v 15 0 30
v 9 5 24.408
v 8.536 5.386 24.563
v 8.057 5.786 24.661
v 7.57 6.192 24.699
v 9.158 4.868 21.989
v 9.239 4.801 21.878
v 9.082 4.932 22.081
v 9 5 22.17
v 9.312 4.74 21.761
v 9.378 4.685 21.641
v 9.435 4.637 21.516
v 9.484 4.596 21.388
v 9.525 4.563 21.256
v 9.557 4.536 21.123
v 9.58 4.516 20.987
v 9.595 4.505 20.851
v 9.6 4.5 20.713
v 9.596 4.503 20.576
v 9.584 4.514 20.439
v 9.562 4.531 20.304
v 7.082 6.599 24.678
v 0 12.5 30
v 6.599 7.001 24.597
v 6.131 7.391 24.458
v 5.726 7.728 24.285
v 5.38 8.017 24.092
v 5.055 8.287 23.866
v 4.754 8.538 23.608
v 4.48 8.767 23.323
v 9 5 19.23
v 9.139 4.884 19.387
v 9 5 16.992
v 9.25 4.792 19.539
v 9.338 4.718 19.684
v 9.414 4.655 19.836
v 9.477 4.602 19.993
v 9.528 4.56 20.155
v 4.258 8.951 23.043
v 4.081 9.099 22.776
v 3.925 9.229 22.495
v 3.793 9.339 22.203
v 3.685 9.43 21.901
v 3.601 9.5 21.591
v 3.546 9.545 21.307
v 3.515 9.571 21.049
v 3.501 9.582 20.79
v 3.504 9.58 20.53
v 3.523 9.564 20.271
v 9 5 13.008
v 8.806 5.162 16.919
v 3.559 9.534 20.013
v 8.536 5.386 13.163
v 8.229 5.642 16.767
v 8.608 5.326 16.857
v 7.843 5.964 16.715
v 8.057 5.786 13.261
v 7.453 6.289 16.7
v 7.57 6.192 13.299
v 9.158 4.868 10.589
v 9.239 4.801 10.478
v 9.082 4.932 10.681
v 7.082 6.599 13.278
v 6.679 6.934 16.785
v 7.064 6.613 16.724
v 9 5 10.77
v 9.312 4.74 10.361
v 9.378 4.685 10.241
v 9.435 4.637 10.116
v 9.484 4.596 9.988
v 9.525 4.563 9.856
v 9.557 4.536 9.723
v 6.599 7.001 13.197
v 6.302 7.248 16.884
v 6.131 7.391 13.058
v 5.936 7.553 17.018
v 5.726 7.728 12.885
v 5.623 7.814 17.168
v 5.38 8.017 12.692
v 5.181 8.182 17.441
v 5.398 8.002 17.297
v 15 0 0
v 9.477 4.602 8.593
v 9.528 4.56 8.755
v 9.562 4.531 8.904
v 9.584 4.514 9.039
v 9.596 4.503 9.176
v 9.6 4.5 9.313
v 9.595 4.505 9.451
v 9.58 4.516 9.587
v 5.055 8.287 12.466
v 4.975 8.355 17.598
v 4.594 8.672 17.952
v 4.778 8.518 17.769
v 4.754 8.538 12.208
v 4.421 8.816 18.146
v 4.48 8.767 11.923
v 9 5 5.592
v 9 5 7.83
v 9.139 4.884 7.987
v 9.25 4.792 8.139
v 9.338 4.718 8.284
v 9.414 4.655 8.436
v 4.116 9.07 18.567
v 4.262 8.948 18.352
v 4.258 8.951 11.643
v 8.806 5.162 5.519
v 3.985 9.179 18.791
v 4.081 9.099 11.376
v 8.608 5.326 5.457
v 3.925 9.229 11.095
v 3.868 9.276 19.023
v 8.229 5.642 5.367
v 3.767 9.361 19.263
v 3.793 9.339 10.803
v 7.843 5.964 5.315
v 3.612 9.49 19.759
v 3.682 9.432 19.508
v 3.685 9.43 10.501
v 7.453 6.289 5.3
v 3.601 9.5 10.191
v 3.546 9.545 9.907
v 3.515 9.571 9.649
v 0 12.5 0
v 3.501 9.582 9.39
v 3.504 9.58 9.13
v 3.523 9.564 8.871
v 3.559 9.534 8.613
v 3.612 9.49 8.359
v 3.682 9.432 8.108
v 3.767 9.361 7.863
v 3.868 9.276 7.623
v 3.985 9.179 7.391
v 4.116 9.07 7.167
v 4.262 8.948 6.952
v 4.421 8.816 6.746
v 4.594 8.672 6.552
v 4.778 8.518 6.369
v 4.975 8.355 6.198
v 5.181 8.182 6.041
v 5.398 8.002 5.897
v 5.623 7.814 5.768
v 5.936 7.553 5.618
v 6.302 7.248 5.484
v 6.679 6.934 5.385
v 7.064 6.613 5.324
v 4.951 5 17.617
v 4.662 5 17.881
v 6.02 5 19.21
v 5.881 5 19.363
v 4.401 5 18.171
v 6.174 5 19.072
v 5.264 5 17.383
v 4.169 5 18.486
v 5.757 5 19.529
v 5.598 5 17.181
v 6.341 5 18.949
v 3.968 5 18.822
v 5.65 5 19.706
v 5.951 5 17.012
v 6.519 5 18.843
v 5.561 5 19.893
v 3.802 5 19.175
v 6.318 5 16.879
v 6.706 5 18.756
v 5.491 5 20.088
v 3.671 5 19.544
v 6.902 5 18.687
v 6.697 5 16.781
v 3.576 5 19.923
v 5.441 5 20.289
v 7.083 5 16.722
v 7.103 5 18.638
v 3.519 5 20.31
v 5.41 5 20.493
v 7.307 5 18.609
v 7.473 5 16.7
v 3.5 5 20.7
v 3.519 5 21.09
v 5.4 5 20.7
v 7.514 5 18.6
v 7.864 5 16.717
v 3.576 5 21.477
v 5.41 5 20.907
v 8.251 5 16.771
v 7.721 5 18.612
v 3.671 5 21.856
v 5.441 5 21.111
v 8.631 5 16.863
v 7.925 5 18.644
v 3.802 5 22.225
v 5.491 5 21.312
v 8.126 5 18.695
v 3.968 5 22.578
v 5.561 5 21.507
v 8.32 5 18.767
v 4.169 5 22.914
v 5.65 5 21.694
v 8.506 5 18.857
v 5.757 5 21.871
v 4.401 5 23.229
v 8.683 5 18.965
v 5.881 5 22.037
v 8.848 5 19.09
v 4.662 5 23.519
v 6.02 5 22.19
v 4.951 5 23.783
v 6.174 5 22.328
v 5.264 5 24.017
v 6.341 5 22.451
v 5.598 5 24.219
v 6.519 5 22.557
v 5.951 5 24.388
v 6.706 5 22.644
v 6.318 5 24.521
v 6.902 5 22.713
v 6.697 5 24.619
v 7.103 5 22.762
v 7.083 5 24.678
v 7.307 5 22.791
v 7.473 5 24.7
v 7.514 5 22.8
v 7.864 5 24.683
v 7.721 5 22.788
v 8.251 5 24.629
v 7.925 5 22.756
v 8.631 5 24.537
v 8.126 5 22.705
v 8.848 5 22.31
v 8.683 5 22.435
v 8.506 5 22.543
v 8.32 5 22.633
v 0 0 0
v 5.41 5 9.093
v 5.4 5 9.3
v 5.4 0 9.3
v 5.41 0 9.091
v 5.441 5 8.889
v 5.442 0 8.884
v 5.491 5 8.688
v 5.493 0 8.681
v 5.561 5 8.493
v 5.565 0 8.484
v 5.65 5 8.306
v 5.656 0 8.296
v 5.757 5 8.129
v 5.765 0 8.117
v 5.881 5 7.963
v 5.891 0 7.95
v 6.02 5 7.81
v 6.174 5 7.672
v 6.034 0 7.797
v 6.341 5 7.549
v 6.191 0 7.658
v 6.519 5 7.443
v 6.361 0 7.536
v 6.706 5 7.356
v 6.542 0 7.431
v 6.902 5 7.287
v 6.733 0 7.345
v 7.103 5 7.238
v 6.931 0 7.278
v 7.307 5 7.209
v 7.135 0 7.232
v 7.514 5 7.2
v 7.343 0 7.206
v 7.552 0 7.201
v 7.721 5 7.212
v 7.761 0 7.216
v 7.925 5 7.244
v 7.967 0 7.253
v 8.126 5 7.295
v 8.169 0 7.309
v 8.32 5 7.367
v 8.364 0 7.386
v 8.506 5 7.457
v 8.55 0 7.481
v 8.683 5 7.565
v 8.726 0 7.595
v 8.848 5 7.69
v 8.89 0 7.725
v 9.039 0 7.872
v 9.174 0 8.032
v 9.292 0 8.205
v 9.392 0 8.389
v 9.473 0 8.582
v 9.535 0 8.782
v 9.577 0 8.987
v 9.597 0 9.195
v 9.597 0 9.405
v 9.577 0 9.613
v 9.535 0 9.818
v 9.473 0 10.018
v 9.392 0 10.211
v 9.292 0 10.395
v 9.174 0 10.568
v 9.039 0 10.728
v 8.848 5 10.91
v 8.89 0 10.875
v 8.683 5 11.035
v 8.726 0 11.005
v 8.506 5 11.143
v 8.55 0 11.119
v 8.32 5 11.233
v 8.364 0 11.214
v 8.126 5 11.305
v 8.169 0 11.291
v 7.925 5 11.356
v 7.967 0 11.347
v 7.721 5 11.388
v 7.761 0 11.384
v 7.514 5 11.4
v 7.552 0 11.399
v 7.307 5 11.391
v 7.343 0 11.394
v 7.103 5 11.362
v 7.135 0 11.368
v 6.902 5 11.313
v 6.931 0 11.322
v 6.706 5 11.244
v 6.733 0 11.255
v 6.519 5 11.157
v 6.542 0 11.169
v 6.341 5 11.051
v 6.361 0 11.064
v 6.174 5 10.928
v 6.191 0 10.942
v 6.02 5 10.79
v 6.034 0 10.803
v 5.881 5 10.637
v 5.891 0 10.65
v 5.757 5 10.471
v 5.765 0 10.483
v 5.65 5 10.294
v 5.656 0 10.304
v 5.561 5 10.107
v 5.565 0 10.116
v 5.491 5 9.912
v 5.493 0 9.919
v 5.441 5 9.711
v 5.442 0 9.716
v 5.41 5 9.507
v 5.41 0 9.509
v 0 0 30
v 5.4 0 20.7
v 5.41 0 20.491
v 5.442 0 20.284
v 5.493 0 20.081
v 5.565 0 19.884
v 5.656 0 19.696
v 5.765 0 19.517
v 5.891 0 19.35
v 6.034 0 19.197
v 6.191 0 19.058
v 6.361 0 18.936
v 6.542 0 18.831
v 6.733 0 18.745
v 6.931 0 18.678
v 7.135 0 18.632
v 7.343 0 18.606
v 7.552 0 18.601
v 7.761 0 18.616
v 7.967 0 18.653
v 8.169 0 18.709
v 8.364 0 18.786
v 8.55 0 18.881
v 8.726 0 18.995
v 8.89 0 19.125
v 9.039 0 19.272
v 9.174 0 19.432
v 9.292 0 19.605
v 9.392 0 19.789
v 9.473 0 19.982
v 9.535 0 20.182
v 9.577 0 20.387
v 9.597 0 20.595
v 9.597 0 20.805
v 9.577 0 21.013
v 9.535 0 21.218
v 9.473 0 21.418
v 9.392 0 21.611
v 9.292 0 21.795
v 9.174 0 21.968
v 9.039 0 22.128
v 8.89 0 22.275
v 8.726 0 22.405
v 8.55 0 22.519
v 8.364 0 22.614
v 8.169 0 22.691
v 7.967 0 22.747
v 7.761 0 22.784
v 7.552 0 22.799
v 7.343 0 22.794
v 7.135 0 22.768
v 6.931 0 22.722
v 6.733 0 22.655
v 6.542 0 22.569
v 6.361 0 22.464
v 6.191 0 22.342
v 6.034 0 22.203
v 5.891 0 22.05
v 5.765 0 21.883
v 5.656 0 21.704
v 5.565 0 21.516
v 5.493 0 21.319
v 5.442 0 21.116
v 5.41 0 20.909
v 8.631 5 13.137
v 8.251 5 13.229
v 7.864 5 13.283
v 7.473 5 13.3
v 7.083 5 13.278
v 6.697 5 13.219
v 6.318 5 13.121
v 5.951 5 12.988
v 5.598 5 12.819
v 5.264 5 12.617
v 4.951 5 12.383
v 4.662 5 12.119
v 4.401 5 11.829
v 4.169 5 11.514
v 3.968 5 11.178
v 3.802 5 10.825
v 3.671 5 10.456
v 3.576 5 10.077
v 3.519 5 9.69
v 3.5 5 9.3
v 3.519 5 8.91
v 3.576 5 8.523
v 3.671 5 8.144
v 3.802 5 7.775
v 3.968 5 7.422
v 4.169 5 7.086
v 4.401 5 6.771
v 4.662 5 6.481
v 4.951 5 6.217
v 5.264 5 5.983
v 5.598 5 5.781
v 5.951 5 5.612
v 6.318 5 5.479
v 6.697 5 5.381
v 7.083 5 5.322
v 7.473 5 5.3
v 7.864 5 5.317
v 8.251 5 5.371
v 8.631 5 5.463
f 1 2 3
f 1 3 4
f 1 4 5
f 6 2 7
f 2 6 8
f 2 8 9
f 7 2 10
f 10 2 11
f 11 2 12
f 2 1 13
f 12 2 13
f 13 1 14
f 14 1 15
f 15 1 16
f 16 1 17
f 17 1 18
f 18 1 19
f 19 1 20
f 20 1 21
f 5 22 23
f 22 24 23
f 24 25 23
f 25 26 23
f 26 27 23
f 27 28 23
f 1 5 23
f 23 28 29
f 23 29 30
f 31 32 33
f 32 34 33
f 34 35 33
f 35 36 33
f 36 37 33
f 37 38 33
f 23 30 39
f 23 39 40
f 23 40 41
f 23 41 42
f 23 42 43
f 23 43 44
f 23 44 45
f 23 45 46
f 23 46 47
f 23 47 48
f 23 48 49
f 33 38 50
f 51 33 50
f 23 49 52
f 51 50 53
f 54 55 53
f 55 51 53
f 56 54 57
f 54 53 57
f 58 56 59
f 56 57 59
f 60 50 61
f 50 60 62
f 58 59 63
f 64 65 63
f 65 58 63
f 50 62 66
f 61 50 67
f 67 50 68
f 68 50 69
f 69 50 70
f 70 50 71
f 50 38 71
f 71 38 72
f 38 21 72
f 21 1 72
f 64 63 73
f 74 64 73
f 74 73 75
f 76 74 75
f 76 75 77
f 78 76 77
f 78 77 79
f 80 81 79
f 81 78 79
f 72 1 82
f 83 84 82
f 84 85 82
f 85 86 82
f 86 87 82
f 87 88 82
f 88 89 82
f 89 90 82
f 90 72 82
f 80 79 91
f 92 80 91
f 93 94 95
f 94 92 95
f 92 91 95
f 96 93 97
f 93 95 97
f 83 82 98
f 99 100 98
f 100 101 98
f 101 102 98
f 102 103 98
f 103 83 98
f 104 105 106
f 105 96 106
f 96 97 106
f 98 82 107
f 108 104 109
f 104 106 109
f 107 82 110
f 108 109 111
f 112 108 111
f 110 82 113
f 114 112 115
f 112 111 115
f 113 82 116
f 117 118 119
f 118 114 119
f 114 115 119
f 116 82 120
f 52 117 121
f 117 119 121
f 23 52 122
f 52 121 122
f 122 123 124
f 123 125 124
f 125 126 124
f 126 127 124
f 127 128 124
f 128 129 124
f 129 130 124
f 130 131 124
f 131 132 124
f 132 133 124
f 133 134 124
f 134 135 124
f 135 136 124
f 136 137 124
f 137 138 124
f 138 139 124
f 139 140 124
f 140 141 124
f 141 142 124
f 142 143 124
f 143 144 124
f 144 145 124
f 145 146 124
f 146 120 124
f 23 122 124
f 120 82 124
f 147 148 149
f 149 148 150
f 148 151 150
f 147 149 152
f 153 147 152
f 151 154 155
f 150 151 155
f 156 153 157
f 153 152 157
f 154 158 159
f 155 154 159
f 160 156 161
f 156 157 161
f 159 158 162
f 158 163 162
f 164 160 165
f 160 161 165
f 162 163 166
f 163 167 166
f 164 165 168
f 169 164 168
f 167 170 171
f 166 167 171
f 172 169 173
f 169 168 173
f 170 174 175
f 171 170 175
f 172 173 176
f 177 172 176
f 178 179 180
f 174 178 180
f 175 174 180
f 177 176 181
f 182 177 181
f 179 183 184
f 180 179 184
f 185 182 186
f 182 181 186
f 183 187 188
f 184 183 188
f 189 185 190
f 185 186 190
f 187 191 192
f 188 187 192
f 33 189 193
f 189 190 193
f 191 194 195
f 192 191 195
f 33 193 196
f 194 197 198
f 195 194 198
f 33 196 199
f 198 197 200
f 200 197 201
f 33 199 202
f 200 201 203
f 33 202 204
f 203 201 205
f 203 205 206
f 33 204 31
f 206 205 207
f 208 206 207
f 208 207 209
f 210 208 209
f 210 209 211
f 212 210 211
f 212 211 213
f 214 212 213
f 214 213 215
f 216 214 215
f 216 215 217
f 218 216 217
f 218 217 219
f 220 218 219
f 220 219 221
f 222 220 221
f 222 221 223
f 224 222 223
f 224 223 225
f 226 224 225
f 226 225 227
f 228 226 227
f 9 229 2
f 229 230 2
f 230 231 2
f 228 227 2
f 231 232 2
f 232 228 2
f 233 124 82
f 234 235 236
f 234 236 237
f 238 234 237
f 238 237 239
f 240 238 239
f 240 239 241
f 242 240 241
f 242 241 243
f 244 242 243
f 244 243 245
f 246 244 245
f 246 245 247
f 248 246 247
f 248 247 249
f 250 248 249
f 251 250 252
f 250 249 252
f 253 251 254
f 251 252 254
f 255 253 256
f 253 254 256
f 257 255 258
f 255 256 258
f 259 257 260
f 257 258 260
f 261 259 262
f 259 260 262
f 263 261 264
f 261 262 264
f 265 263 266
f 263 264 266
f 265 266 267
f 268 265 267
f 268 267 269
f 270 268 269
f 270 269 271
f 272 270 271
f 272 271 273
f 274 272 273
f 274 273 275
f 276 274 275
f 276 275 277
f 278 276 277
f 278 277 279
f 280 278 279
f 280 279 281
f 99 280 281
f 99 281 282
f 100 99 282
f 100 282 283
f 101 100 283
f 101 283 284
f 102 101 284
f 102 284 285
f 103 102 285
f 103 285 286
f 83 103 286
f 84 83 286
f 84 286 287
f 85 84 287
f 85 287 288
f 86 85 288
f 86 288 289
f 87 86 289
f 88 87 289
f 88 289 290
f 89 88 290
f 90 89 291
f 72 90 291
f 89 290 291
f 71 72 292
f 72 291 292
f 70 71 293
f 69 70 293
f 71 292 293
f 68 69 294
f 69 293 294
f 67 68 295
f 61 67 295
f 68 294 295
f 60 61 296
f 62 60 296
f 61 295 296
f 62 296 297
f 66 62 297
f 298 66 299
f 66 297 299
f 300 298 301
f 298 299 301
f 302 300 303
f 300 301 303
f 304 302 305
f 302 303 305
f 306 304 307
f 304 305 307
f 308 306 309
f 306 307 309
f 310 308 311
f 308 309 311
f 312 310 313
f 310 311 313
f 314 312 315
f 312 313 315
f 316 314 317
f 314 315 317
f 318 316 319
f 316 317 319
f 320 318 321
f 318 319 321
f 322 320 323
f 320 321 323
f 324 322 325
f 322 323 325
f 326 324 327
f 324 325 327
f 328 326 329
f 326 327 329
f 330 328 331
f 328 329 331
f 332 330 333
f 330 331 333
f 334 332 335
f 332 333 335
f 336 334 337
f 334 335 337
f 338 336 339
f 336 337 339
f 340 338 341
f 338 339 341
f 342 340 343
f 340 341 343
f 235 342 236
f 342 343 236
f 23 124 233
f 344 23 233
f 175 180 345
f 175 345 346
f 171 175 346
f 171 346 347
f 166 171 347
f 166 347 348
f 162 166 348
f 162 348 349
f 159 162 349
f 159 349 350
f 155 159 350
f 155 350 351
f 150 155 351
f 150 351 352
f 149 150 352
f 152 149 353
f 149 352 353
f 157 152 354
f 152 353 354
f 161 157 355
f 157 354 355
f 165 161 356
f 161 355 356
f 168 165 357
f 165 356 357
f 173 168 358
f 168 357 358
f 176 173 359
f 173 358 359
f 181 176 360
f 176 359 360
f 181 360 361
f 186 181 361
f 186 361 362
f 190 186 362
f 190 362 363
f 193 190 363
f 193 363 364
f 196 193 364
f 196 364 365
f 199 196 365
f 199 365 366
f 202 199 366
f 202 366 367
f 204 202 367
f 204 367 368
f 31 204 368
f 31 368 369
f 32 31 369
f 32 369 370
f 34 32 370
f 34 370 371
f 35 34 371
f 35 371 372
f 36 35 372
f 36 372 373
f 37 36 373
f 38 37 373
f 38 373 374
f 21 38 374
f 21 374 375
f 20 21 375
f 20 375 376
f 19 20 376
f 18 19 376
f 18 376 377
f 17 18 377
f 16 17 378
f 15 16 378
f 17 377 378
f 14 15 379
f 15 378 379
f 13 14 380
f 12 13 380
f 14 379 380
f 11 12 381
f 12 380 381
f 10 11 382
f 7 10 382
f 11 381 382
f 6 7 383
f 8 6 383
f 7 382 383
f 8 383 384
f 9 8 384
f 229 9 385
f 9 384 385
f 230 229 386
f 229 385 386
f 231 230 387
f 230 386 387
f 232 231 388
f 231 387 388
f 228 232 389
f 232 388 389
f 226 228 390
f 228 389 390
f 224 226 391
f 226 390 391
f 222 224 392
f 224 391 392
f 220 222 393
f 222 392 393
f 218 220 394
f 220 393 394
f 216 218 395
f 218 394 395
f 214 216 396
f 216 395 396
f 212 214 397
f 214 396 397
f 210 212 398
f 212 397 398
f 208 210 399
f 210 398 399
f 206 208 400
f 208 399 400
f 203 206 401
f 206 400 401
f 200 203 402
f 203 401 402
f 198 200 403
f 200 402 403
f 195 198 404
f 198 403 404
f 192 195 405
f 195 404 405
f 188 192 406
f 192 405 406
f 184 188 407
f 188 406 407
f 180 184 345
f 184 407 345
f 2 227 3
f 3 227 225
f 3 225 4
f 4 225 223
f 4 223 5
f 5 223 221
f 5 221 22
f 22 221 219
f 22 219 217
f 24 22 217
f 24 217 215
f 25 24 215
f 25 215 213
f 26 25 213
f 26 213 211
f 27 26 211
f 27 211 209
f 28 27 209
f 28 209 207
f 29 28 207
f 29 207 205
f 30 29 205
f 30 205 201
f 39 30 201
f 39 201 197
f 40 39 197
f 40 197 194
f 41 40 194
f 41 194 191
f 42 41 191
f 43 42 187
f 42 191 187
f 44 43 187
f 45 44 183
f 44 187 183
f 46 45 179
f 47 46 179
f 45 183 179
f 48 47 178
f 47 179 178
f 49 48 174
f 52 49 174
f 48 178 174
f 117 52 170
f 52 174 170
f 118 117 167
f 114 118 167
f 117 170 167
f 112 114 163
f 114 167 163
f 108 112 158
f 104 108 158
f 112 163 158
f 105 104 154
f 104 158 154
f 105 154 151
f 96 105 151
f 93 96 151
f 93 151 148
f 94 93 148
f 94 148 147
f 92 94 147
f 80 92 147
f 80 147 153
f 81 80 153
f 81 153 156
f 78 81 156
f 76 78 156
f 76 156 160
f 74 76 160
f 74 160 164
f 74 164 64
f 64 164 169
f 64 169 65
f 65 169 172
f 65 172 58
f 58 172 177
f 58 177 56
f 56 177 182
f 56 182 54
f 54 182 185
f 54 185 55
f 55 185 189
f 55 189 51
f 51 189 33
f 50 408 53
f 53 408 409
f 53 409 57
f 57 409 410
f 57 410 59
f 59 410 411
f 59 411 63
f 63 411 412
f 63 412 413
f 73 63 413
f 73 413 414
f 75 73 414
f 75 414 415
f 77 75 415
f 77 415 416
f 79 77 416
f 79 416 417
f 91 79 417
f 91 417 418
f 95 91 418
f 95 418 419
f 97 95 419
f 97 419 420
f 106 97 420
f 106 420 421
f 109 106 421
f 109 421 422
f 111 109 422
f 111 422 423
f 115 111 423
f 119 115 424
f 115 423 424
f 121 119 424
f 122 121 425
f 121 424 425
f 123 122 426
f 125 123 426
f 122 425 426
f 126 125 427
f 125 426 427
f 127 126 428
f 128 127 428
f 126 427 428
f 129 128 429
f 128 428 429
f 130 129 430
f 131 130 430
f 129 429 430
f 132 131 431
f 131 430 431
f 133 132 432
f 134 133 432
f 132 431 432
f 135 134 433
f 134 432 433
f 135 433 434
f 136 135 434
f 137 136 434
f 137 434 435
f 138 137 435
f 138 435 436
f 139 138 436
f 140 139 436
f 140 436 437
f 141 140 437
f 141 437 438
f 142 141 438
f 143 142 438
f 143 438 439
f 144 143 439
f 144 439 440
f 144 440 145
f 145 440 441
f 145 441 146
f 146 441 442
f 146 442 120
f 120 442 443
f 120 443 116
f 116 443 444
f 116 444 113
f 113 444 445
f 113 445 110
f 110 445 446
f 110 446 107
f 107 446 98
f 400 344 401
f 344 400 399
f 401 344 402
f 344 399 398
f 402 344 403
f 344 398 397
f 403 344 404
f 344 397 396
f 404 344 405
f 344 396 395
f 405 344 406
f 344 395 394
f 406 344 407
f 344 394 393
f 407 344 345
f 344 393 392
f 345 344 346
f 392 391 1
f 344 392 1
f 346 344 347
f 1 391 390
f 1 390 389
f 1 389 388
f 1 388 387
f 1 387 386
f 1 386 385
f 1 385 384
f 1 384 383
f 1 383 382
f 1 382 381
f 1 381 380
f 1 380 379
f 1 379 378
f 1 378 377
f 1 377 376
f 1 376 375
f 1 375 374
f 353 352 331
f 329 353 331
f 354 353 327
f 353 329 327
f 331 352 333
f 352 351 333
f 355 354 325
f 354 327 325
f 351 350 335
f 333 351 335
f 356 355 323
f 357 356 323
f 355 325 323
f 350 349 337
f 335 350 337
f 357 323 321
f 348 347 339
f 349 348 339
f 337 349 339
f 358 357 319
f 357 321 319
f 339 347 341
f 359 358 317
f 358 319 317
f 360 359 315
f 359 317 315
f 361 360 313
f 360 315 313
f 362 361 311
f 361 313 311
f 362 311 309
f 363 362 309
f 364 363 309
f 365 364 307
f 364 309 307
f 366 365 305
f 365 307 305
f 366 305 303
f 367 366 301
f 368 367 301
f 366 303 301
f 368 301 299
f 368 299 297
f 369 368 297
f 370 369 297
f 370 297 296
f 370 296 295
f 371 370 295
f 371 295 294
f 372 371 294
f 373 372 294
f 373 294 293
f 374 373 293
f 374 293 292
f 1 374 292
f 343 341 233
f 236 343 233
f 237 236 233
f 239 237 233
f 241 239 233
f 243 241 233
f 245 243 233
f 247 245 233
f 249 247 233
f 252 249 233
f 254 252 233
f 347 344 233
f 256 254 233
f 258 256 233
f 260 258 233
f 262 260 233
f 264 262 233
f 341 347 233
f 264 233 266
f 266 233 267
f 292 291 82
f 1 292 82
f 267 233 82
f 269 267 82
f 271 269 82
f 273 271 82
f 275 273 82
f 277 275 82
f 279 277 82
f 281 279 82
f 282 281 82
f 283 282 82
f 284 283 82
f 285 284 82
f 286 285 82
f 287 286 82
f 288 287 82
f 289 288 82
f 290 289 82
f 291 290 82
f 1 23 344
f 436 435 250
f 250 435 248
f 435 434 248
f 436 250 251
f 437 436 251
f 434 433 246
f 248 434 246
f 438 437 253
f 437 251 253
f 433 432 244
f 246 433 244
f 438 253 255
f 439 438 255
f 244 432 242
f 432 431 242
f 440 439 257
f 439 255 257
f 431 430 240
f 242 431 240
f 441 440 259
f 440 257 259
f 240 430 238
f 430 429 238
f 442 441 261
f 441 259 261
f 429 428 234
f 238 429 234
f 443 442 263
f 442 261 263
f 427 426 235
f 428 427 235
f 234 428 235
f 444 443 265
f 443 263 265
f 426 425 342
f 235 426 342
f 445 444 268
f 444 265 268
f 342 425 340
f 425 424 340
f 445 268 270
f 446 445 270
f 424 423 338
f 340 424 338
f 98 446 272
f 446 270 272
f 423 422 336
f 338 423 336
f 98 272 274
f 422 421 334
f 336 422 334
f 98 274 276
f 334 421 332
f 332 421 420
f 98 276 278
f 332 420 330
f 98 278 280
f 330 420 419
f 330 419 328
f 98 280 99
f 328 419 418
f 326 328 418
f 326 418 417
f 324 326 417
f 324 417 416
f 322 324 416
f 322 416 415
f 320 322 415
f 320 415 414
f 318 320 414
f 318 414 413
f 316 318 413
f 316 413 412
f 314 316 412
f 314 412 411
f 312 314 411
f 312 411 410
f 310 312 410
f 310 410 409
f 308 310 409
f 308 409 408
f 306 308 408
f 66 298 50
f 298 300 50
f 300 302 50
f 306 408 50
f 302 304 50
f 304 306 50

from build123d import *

# Parameters (mm, degrees)
EXTRUDE_1_DEPTH     = 30
SKETCH_2_R          = 2.1
CUT_EXTRUDE_1_DEPTH = 30
CUT_EXTRUDE_START   = -5
SKETCH_3_R          = 4
CUT_EXTRUDE_2_DEPTH = 8.5


with BuildPart() as part:
    # 草圖1 → 填料-伸長1 (new body)
    with BuildSketch(Plane.XY):
        Polygon((0, 0), (15, 0), (0, 12.5), align=None)
    extrude(amount=EXTRUDE_1_DEPTH)

    # 草圖2 → 除料-伸長1 (cut)
    with BuildSketch(Plane(origin=(0, 0, 0), x_dir=(-1, 0, 0), z_dir=(0, -1, 0))):
        with Locations((-7.5, -20.7)):
            Circle(SKETCH_2_R)
        with Locations((-7.5, -9.3)):
            Circle(SKETCH_2_R)
    extrude(amount=-CUT_EXTRUDE_1_DEPTH, mode=Mode.SUBTRACT)

    # 草圖3 → 除料-伸長2 (cut, through all)
    with BuildSketch(Plane.XZ.offset(CUT_EXTRUDE_START)):
        with Locations((7.5, 20.7)):
            Circle(SKETCH_3_R)
        with Locations((7.5, 9.3)):
            Circle(SKETCH_3_R)
    extrude(amount=-CUT_EXTRUDE_2_DEPTH, mode=Mode.SUBTRACT)


solid = part.part
